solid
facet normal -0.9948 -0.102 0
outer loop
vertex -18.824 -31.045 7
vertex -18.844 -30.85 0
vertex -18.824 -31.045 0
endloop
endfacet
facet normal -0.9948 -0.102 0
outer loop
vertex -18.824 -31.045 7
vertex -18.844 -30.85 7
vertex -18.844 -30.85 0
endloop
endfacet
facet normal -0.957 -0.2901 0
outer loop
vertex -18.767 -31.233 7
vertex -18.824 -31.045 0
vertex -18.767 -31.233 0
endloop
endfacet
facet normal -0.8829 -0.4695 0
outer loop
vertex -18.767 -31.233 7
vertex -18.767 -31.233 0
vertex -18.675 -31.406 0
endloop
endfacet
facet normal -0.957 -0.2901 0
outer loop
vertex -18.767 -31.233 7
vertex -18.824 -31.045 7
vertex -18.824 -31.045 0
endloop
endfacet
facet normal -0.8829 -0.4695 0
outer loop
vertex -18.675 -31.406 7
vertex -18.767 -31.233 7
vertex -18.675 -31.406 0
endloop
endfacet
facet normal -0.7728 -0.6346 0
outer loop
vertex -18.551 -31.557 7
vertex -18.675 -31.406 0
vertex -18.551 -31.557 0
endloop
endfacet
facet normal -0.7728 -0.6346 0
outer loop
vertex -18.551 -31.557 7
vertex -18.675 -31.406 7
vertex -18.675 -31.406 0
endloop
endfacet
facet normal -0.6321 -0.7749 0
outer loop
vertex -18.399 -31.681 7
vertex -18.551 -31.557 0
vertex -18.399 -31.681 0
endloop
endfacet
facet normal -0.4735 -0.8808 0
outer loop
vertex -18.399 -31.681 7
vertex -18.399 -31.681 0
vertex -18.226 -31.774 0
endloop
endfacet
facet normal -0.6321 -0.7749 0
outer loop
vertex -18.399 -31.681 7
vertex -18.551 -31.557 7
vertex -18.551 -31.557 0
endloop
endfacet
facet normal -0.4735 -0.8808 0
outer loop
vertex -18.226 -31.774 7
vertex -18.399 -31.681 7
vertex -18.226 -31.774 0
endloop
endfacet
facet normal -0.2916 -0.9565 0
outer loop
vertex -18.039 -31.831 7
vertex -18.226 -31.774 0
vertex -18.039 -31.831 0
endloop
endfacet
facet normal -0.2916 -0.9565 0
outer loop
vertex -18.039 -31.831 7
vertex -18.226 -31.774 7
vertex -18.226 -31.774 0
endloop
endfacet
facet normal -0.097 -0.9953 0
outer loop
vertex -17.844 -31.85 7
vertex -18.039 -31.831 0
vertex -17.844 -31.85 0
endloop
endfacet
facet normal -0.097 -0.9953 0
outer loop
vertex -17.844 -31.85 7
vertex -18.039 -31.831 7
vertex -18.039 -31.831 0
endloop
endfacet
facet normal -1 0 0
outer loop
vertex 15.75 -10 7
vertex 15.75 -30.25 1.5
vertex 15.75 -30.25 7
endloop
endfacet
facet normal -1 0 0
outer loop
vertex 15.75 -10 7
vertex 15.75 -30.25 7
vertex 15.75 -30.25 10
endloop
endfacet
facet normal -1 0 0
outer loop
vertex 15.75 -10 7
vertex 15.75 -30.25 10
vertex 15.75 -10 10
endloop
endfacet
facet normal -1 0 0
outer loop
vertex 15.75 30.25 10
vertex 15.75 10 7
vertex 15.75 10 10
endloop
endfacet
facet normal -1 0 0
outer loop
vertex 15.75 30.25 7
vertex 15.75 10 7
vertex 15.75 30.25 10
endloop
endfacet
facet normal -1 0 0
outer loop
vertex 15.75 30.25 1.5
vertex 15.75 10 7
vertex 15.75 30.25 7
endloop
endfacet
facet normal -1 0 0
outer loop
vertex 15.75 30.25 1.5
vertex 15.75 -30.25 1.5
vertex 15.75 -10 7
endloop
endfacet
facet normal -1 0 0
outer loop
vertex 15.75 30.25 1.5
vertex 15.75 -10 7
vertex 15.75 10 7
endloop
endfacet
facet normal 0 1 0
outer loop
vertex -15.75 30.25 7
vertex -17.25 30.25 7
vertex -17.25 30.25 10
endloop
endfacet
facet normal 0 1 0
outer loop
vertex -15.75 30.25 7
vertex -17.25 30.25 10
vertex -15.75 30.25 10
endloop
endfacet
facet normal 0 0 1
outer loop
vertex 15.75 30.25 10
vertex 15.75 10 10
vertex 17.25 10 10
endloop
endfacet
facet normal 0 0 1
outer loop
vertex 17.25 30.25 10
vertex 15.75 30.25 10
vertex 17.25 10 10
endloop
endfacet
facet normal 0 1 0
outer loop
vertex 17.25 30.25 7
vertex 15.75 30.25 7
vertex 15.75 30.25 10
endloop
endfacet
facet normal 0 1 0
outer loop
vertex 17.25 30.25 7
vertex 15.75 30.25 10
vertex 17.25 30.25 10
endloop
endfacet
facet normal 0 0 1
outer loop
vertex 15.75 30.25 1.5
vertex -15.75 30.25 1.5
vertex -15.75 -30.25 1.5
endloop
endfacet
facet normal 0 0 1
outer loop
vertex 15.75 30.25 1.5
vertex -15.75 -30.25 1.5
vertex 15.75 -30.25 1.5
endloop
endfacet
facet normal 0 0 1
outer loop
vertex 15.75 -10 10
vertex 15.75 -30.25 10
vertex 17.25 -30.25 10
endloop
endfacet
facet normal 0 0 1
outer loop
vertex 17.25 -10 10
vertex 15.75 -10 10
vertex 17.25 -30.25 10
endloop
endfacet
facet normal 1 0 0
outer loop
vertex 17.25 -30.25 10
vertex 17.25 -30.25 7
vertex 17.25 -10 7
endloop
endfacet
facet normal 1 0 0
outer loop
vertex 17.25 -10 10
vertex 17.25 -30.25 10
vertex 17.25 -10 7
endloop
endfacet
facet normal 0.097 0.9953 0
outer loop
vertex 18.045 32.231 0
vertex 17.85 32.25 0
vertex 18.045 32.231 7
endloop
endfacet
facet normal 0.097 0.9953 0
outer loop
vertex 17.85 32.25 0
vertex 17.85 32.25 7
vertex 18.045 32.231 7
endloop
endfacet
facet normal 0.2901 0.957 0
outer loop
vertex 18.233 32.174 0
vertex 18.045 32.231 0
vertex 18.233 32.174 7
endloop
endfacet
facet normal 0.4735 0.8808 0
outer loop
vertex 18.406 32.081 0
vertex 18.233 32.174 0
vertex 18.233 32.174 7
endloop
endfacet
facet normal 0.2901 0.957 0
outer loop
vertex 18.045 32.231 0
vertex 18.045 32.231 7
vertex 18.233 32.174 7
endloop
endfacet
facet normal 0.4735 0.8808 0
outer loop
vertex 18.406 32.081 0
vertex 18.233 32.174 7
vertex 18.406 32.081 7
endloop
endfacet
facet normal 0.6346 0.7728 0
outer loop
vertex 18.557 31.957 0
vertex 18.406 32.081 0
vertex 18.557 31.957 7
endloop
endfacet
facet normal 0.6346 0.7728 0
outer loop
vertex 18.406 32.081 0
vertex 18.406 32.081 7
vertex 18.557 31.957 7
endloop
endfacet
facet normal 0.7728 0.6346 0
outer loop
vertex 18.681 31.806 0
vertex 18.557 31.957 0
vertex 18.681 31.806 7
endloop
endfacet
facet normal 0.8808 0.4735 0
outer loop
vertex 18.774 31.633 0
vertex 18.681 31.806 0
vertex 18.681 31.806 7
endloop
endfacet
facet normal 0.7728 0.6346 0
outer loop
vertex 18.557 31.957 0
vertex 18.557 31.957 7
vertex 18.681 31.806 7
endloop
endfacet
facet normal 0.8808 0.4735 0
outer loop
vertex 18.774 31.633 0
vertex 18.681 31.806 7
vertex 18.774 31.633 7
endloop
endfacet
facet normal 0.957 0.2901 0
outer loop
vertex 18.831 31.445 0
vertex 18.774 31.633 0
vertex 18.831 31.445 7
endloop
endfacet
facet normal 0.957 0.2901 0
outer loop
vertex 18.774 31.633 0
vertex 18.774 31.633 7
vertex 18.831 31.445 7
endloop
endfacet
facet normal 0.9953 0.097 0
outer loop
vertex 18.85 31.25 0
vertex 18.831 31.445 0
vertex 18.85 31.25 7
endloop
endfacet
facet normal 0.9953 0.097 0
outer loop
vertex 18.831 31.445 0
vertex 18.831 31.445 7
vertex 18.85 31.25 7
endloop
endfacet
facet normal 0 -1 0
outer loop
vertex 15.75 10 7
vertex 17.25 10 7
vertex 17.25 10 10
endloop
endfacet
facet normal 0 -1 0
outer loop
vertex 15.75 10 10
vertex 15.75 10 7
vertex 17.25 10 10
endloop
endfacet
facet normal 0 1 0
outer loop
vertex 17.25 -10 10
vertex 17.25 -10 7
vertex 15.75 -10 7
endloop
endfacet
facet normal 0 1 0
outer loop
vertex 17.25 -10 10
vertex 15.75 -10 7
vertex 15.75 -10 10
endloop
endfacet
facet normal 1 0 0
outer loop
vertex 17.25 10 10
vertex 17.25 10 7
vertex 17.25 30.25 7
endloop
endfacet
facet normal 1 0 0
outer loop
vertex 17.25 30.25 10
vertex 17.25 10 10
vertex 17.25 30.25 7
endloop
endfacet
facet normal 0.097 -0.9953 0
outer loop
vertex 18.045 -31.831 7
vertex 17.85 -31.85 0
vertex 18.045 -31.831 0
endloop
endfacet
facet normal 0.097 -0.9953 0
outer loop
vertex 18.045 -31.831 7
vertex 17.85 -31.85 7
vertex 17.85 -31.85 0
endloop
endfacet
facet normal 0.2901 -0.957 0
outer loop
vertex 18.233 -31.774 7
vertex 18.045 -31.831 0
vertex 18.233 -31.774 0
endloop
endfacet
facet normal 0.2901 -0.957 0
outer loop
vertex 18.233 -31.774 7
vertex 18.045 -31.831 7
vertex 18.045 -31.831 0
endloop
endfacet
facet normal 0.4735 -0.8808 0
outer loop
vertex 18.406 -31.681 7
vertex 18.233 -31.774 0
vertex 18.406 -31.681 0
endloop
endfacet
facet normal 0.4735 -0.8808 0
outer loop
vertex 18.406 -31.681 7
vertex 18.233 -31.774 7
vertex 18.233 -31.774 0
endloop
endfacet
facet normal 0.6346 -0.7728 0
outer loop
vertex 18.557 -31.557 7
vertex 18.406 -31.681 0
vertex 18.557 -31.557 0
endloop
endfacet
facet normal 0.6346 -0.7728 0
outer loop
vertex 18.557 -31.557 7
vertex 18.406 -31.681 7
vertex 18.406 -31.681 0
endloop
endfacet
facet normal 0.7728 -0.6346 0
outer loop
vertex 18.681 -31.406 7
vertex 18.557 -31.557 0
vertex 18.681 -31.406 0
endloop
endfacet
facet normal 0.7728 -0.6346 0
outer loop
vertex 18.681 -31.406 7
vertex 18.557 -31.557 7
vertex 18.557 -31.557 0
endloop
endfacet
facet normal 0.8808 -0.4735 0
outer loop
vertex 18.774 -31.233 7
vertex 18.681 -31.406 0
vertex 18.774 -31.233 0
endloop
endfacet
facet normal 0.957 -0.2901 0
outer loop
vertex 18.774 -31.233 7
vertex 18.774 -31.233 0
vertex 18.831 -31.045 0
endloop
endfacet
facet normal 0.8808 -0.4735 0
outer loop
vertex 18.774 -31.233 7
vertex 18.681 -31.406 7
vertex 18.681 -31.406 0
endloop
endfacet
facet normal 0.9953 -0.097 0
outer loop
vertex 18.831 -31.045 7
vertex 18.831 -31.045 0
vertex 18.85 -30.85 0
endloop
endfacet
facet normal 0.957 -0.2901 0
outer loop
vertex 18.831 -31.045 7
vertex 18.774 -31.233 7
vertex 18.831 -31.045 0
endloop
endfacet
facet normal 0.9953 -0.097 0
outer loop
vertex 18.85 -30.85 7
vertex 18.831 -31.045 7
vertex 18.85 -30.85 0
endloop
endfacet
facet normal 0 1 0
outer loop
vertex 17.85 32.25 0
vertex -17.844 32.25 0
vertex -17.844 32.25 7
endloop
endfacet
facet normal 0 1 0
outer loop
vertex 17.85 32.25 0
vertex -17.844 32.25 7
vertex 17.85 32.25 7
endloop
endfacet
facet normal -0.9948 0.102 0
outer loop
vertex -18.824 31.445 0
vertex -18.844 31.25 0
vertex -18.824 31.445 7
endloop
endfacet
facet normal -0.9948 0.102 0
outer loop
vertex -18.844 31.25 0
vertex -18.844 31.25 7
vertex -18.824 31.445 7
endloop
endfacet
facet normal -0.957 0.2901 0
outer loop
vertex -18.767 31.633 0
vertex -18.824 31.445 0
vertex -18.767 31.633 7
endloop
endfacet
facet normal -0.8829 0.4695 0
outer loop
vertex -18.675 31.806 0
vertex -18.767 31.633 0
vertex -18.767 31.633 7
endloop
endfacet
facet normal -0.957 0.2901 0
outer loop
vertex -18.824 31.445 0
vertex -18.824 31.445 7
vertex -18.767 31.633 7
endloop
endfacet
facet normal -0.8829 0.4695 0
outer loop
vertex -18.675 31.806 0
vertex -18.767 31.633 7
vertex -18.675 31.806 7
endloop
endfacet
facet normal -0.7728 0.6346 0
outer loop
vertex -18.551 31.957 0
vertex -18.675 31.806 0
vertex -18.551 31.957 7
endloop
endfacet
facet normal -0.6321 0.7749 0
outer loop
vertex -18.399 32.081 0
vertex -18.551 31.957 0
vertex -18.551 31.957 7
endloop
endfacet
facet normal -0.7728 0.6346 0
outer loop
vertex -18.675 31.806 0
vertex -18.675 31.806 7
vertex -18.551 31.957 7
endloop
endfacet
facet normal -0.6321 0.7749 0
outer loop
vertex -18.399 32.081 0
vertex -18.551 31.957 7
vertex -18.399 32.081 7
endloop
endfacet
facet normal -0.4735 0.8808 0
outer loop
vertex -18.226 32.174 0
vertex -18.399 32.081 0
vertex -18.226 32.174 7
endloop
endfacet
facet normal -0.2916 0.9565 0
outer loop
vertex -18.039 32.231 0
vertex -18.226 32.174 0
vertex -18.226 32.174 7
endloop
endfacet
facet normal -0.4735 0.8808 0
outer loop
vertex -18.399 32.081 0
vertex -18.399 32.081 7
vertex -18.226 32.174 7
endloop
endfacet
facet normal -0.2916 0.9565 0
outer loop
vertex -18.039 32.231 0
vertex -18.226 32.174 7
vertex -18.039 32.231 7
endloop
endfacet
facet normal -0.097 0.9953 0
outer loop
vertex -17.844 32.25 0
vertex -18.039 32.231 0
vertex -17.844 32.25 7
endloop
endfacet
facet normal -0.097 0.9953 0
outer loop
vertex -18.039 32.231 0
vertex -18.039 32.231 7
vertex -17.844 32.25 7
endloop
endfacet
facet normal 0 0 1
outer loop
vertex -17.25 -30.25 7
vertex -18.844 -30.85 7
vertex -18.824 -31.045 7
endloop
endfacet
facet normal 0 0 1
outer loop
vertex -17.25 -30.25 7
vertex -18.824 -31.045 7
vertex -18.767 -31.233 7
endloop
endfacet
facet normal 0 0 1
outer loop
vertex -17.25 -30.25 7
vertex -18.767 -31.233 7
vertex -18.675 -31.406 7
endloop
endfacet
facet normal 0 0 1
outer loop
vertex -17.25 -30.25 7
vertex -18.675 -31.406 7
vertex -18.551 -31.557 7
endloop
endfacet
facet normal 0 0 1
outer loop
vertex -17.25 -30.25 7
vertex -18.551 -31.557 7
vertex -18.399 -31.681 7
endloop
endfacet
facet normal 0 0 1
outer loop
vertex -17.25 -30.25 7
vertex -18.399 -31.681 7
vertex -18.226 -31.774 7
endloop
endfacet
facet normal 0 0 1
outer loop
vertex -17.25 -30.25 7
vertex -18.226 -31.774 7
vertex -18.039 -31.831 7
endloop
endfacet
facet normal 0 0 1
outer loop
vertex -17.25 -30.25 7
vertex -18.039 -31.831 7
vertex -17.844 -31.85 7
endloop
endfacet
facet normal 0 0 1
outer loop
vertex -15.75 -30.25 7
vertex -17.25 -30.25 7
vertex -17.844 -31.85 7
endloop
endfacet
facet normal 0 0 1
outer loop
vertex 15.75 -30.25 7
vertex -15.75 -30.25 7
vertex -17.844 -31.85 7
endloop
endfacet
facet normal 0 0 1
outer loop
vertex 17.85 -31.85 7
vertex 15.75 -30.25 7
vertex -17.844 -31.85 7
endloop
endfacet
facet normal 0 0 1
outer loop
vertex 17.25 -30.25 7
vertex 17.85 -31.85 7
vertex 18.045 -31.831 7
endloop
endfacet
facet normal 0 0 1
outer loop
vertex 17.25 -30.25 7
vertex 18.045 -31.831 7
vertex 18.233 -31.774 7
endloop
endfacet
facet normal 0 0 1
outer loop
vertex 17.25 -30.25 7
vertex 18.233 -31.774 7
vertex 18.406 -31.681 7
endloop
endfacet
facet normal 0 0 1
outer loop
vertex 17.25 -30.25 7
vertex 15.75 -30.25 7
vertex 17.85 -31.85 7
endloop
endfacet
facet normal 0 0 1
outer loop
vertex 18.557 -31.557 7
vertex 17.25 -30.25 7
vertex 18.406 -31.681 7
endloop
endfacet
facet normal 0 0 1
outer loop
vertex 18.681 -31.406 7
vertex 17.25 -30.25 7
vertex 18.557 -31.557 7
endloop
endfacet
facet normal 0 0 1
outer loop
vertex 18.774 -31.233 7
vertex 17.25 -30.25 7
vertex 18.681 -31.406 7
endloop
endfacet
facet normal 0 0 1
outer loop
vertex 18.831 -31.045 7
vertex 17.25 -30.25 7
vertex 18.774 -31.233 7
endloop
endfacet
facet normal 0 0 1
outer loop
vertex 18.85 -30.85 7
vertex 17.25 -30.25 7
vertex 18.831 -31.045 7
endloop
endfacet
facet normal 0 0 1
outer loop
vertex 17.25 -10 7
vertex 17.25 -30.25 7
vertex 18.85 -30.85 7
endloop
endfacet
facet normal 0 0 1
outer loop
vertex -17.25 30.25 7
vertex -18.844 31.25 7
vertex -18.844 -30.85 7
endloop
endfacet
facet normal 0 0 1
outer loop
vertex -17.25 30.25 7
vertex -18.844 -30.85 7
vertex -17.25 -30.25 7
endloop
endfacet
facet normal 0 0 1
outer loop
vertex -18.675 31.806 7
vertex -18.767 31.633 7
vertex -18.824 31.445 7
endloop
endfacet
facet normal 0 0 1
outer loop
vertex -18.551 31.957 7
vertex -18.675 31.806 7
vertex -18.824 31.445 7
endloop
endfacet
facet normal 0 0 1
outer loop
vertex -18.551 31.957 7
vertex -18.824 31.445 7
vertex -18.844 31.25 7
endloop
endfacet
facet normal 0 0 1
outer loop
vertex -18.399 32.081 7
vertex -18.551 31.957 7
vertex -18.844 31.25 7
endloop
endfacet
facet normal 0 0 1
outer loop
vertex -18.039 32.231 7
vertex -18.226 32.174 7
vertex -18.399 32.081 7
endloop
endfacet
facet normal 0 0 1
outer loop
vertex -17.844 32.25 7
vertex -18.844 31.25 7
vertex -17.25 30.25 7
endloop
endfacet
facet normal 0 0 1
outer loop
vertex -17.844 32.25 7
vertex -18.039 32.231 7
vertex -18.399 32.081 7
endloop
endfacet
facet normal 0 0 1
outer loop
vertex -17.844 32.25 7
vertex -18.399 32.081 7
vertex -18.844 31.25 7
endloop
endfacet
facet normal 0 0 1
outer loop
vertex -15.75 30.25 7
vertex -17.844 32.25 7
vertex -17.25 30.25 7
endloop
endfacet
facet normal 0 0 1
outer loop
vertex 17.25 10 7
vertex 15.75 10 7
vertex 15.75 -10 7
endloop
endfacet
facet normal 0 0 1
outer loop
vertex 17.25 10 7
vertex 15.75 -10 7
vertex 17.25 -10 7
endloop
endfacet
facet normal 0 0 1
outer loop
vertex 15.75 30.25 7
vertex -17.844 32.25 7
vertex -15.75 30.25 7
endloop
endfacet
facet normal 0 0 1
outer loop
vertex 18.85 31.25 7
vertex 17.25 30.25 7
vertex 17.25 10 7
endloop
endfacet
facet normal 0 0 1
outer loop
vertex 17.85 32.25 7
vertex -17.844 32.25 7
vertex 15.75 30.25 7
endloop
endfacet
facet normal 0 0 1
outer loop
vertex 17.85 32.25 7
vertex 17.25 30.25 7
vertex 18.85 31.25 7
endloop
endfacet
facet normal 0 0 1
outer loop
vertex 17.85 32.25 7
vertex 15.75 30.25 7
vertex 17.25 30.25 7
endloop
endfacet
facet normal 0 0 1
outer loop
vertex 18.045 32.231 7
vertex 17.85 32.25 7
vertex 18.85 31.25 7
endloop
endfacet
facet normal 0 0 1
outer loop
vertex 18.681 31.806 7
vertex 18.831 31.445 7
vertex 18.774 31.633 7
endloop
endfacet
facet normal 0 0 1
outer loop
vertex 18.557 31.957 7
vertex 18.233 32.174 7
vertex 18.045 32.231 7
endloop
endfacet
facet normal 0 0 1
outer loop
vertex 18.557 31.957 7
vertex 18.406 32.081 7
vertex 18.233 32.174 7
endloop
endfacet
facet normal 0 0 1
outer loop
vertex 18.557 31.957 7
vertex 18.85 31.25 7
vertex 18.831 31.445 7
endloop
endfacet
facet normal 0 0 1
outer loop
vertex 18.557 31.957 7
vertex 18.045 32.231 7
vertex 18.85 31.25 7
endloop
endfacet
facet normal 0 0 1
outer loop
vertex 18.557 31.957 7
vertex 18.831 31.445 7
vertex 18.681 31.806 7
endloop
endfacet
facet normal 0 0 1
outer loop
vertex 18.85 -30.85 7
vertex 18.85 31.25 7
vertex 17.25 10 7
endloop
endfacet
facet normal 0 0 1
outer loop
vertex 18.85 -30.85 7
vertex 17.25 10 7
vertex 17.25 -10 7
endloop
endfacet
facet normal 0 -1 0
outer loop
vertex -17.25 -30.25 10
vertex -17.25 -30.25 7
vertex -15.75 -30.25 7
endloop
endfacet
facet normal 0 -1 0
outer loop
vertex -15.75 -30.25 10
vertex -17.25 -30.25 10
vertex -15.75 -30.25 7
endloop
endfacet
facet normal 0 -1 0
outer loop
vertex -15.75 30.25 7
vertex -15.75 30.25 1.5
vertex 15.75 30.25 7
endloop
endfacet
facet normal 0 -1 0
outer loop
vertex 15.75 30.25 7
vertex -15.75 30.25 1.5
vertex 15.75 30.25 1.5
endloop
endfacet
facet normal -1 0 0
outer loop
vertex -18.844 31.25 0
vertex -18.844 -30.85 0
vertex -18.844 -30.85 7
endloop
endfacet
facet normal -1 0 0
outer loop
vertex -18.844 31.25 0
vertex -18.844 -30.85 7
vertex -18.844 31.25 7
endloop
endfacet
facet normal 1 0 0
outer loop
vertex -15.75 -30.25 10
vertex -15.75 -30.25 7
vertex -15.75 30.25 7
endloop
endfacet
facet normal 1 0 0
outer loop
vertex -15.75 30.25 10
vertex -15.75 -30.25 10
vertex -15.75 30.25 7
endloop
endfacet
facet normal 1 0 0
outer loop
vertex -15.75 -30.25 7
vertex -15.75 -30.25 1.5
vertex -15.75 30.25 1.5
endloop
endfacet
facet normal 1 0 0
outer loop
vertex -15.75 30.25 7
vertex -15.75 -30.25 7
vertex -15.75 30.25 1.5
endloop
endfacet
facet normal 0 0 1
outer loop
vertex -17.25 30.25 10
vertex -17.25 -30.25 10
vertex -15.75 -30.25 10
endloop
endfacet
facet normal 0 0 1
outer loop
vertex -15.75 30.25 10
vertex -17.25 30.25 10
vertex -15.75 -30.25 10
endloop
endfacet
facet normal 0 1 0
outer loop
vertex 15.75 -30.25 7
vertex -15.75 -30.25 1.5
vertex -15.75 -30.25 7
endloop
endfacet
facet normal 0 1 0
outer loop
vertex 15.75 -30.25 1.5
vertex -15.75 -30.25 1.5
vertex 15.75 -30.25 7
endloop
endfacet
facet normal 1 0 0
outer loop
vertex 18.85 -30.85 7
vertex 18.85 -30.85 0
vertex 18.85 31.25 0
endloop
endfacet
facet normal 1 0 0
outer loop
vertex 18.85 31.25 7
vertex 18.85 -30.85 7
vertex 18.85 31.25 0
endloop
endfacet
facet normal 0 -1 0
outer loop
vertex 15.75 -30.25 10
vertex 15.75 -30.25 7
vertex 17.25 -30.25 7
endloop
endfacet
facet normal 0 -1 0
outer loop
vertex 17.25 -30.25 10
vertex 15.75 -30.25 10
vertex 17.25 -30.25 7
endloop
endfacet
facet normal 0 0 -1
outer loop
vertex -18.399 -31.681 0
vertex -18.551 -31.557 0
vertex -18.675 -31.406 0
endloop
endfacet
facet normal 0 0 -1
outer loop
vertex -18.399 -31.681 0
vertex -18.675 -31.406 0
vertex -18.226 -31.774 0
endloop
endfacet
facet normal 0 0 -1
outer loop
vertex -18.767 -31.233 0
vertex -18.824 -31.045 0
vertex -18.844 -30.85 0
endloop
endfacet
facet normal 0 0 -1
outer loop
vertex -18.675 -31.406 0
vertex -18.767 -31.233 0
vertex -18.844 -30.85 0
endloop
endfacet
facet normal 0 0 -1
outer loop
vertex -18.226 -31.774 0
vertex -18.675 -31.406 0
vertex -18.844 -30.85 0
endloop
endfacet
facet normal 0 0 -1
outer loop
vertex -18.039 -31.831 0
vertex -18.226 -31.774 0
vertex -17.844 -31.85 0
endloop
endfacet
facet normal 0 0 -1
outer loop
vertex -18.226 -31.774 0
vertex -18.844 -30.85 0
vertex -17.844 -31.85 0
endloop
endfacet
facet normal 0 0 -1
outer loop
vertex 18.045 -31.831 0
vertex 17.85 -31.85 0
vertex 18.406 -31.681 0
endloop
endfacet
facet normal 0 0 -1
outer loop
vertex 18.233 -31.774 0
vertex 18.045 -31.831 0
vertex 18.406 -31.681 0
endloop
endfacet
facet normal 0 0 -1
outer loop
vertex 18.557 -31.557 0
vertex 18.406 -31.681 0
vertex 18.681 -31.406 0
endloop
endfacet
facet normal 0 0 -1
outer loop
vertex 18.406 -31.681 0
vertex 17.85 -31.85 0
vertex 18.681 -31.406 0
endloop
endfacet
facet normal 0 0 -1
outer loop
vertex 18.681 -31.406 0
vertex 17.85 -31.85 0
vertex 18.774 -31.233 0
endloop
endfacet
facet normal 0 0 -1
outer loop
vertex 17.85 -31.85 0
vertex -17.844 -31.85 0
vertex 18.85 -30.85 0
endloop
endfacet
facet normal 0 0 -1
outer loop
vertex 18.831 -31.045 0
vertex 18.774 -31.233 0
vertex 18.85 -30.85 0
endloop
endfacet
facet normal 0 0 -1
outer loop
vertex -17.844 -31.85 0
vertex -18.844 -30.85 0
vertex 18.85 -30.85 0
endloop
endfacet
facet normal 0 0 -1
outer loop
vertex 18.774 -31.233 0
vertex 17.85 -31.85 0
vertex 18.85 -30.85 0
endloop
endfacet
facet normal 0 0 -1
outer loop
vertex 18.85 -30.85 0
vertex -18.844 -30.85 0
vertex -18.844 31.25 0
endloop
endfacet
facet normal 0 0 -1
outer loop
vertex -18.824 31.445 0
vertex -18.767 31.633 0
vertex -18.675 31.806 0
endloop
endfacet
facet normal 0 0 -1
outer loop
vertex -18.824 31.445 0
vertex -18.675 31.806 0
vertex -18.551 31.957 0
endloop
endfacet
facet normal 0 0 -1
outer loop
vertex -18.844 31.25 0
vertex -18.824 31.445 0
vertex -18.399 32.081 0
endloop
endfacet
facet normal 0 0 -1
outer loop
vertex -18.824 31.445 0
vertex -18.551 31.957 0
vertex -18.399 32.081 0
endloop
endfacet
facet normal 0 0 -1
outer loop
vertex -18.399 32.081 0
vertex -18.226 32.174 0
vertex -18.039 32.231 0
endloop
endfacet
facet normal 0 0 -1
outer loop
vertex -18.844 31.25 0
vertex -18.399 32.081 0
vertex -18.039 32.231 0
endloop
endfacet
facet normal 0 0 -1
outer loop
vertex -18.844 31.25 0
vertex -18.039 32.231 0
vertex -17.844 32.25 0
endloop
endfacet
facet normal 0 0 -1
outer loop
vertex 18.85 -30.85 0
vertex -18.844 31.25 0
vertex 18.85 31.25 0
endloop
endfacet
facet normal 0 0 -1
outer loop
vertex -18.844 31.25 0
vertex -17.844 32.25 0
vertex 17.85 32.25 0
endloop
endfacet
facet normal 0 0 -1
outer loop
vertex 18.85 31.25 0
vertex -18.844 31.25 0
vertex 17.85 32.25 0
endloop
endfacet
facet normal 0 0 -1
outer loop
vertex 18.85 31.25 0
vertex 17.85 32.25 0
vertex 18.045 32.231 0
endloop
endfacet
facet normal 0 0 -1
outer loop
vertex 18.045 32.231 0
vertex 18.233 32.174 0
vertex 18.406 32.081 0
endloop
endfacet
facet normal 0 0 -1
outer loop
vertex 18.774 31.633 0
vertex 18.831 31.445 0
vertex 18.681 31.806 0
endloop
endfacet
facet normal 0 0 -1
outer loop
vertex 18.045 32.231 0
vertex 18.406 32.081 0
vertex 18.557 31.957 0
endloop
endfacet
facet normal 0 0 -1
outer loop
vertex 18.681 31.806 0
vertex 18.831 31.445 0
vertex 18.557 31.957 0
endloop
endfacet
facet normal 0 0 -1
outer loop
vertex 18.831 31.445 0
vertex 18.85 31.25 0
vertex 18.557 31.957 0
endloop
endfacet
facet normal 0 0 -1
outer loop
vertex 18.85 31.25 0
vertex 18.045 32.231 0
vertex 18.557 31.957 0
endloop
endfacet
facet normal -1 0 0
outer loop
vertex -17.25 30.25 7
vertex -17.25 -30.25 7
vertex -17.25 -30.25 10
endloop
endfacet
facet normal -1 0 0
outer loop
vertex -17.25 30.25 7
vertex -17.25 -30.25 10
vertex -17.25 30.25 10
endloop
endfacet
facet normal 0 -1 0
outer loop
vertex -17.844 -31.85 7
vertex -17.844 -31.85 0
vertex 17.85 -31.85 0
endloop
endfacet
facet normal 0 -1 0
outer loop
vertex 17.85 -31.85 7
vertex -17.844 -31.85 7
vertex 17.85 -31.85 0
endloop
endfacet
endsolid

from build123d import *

# Parameters (mm, degrees)
F0_W     = 37.693575
F0_H     = 64.1
F0_W_2   = 31.5
F0_H_2   = 60.5
F1_DEPTH = 7
F2_DEPTH = 1.5
F3_W     = 1.5
F3_H     = 60.5
F4_DEPTH = 3
F5_R     = 1
F6_W     = 20
F6_H     = 3
F7_DEPTH = 1.5


with BuildPart() as f1:
    # F0 (on Top) → F1 (new body)
    with BuildSketch(Plane.XY):
        with Locations((0.003213, 0.2)):
            Rectangle(F0_W, F0_H)
        Rectangle(F0_W_2, F0_H_2, mode=Mode.SUBTRACT)
    extrude(amount=F1_DEPTH)

    # F0 (on Top) → F2 (join)
    with BuildSketch(Plane.XY):
        Rectangle(F0_W_2, F0_H_2)
    extrude(amount=F2_DEPTH)

    # F3 (on face) → F4 (join)
    with BuildSketch(Plane.XY.offset(7)):
        with Locations((-16.5, 0)):
            Rectangle(F3_W, F3_H)
        with Locations((16.5, 0)):
            Rectangle(F3_W, F3_H)
    extrude(amount=F4_DEPTH)

    # F5
    f5_edges = [f1.edges().sort_by_distance(p)[0] for p in [
        (-18.843575, -31.85, 3.5),
        (18.85, -31.85, 3.5),
        (18.85, 32.25, 3.5),
        (-18.843575, 32.25, 3.5),
    ]]
    fillet(f5_edges, radius=F5_R)

    # F6 (on face) → F7 (cut, through all)
    with BuildSketch(Plane.YZ.offset(17.25)):
        with Locations((0, 8.5)):
            Rectangle(F6_W, F6_H)
    extrude(amount=-F7_DEPTH, mode=Mode.SUBTRACT)


solid = f1.part
